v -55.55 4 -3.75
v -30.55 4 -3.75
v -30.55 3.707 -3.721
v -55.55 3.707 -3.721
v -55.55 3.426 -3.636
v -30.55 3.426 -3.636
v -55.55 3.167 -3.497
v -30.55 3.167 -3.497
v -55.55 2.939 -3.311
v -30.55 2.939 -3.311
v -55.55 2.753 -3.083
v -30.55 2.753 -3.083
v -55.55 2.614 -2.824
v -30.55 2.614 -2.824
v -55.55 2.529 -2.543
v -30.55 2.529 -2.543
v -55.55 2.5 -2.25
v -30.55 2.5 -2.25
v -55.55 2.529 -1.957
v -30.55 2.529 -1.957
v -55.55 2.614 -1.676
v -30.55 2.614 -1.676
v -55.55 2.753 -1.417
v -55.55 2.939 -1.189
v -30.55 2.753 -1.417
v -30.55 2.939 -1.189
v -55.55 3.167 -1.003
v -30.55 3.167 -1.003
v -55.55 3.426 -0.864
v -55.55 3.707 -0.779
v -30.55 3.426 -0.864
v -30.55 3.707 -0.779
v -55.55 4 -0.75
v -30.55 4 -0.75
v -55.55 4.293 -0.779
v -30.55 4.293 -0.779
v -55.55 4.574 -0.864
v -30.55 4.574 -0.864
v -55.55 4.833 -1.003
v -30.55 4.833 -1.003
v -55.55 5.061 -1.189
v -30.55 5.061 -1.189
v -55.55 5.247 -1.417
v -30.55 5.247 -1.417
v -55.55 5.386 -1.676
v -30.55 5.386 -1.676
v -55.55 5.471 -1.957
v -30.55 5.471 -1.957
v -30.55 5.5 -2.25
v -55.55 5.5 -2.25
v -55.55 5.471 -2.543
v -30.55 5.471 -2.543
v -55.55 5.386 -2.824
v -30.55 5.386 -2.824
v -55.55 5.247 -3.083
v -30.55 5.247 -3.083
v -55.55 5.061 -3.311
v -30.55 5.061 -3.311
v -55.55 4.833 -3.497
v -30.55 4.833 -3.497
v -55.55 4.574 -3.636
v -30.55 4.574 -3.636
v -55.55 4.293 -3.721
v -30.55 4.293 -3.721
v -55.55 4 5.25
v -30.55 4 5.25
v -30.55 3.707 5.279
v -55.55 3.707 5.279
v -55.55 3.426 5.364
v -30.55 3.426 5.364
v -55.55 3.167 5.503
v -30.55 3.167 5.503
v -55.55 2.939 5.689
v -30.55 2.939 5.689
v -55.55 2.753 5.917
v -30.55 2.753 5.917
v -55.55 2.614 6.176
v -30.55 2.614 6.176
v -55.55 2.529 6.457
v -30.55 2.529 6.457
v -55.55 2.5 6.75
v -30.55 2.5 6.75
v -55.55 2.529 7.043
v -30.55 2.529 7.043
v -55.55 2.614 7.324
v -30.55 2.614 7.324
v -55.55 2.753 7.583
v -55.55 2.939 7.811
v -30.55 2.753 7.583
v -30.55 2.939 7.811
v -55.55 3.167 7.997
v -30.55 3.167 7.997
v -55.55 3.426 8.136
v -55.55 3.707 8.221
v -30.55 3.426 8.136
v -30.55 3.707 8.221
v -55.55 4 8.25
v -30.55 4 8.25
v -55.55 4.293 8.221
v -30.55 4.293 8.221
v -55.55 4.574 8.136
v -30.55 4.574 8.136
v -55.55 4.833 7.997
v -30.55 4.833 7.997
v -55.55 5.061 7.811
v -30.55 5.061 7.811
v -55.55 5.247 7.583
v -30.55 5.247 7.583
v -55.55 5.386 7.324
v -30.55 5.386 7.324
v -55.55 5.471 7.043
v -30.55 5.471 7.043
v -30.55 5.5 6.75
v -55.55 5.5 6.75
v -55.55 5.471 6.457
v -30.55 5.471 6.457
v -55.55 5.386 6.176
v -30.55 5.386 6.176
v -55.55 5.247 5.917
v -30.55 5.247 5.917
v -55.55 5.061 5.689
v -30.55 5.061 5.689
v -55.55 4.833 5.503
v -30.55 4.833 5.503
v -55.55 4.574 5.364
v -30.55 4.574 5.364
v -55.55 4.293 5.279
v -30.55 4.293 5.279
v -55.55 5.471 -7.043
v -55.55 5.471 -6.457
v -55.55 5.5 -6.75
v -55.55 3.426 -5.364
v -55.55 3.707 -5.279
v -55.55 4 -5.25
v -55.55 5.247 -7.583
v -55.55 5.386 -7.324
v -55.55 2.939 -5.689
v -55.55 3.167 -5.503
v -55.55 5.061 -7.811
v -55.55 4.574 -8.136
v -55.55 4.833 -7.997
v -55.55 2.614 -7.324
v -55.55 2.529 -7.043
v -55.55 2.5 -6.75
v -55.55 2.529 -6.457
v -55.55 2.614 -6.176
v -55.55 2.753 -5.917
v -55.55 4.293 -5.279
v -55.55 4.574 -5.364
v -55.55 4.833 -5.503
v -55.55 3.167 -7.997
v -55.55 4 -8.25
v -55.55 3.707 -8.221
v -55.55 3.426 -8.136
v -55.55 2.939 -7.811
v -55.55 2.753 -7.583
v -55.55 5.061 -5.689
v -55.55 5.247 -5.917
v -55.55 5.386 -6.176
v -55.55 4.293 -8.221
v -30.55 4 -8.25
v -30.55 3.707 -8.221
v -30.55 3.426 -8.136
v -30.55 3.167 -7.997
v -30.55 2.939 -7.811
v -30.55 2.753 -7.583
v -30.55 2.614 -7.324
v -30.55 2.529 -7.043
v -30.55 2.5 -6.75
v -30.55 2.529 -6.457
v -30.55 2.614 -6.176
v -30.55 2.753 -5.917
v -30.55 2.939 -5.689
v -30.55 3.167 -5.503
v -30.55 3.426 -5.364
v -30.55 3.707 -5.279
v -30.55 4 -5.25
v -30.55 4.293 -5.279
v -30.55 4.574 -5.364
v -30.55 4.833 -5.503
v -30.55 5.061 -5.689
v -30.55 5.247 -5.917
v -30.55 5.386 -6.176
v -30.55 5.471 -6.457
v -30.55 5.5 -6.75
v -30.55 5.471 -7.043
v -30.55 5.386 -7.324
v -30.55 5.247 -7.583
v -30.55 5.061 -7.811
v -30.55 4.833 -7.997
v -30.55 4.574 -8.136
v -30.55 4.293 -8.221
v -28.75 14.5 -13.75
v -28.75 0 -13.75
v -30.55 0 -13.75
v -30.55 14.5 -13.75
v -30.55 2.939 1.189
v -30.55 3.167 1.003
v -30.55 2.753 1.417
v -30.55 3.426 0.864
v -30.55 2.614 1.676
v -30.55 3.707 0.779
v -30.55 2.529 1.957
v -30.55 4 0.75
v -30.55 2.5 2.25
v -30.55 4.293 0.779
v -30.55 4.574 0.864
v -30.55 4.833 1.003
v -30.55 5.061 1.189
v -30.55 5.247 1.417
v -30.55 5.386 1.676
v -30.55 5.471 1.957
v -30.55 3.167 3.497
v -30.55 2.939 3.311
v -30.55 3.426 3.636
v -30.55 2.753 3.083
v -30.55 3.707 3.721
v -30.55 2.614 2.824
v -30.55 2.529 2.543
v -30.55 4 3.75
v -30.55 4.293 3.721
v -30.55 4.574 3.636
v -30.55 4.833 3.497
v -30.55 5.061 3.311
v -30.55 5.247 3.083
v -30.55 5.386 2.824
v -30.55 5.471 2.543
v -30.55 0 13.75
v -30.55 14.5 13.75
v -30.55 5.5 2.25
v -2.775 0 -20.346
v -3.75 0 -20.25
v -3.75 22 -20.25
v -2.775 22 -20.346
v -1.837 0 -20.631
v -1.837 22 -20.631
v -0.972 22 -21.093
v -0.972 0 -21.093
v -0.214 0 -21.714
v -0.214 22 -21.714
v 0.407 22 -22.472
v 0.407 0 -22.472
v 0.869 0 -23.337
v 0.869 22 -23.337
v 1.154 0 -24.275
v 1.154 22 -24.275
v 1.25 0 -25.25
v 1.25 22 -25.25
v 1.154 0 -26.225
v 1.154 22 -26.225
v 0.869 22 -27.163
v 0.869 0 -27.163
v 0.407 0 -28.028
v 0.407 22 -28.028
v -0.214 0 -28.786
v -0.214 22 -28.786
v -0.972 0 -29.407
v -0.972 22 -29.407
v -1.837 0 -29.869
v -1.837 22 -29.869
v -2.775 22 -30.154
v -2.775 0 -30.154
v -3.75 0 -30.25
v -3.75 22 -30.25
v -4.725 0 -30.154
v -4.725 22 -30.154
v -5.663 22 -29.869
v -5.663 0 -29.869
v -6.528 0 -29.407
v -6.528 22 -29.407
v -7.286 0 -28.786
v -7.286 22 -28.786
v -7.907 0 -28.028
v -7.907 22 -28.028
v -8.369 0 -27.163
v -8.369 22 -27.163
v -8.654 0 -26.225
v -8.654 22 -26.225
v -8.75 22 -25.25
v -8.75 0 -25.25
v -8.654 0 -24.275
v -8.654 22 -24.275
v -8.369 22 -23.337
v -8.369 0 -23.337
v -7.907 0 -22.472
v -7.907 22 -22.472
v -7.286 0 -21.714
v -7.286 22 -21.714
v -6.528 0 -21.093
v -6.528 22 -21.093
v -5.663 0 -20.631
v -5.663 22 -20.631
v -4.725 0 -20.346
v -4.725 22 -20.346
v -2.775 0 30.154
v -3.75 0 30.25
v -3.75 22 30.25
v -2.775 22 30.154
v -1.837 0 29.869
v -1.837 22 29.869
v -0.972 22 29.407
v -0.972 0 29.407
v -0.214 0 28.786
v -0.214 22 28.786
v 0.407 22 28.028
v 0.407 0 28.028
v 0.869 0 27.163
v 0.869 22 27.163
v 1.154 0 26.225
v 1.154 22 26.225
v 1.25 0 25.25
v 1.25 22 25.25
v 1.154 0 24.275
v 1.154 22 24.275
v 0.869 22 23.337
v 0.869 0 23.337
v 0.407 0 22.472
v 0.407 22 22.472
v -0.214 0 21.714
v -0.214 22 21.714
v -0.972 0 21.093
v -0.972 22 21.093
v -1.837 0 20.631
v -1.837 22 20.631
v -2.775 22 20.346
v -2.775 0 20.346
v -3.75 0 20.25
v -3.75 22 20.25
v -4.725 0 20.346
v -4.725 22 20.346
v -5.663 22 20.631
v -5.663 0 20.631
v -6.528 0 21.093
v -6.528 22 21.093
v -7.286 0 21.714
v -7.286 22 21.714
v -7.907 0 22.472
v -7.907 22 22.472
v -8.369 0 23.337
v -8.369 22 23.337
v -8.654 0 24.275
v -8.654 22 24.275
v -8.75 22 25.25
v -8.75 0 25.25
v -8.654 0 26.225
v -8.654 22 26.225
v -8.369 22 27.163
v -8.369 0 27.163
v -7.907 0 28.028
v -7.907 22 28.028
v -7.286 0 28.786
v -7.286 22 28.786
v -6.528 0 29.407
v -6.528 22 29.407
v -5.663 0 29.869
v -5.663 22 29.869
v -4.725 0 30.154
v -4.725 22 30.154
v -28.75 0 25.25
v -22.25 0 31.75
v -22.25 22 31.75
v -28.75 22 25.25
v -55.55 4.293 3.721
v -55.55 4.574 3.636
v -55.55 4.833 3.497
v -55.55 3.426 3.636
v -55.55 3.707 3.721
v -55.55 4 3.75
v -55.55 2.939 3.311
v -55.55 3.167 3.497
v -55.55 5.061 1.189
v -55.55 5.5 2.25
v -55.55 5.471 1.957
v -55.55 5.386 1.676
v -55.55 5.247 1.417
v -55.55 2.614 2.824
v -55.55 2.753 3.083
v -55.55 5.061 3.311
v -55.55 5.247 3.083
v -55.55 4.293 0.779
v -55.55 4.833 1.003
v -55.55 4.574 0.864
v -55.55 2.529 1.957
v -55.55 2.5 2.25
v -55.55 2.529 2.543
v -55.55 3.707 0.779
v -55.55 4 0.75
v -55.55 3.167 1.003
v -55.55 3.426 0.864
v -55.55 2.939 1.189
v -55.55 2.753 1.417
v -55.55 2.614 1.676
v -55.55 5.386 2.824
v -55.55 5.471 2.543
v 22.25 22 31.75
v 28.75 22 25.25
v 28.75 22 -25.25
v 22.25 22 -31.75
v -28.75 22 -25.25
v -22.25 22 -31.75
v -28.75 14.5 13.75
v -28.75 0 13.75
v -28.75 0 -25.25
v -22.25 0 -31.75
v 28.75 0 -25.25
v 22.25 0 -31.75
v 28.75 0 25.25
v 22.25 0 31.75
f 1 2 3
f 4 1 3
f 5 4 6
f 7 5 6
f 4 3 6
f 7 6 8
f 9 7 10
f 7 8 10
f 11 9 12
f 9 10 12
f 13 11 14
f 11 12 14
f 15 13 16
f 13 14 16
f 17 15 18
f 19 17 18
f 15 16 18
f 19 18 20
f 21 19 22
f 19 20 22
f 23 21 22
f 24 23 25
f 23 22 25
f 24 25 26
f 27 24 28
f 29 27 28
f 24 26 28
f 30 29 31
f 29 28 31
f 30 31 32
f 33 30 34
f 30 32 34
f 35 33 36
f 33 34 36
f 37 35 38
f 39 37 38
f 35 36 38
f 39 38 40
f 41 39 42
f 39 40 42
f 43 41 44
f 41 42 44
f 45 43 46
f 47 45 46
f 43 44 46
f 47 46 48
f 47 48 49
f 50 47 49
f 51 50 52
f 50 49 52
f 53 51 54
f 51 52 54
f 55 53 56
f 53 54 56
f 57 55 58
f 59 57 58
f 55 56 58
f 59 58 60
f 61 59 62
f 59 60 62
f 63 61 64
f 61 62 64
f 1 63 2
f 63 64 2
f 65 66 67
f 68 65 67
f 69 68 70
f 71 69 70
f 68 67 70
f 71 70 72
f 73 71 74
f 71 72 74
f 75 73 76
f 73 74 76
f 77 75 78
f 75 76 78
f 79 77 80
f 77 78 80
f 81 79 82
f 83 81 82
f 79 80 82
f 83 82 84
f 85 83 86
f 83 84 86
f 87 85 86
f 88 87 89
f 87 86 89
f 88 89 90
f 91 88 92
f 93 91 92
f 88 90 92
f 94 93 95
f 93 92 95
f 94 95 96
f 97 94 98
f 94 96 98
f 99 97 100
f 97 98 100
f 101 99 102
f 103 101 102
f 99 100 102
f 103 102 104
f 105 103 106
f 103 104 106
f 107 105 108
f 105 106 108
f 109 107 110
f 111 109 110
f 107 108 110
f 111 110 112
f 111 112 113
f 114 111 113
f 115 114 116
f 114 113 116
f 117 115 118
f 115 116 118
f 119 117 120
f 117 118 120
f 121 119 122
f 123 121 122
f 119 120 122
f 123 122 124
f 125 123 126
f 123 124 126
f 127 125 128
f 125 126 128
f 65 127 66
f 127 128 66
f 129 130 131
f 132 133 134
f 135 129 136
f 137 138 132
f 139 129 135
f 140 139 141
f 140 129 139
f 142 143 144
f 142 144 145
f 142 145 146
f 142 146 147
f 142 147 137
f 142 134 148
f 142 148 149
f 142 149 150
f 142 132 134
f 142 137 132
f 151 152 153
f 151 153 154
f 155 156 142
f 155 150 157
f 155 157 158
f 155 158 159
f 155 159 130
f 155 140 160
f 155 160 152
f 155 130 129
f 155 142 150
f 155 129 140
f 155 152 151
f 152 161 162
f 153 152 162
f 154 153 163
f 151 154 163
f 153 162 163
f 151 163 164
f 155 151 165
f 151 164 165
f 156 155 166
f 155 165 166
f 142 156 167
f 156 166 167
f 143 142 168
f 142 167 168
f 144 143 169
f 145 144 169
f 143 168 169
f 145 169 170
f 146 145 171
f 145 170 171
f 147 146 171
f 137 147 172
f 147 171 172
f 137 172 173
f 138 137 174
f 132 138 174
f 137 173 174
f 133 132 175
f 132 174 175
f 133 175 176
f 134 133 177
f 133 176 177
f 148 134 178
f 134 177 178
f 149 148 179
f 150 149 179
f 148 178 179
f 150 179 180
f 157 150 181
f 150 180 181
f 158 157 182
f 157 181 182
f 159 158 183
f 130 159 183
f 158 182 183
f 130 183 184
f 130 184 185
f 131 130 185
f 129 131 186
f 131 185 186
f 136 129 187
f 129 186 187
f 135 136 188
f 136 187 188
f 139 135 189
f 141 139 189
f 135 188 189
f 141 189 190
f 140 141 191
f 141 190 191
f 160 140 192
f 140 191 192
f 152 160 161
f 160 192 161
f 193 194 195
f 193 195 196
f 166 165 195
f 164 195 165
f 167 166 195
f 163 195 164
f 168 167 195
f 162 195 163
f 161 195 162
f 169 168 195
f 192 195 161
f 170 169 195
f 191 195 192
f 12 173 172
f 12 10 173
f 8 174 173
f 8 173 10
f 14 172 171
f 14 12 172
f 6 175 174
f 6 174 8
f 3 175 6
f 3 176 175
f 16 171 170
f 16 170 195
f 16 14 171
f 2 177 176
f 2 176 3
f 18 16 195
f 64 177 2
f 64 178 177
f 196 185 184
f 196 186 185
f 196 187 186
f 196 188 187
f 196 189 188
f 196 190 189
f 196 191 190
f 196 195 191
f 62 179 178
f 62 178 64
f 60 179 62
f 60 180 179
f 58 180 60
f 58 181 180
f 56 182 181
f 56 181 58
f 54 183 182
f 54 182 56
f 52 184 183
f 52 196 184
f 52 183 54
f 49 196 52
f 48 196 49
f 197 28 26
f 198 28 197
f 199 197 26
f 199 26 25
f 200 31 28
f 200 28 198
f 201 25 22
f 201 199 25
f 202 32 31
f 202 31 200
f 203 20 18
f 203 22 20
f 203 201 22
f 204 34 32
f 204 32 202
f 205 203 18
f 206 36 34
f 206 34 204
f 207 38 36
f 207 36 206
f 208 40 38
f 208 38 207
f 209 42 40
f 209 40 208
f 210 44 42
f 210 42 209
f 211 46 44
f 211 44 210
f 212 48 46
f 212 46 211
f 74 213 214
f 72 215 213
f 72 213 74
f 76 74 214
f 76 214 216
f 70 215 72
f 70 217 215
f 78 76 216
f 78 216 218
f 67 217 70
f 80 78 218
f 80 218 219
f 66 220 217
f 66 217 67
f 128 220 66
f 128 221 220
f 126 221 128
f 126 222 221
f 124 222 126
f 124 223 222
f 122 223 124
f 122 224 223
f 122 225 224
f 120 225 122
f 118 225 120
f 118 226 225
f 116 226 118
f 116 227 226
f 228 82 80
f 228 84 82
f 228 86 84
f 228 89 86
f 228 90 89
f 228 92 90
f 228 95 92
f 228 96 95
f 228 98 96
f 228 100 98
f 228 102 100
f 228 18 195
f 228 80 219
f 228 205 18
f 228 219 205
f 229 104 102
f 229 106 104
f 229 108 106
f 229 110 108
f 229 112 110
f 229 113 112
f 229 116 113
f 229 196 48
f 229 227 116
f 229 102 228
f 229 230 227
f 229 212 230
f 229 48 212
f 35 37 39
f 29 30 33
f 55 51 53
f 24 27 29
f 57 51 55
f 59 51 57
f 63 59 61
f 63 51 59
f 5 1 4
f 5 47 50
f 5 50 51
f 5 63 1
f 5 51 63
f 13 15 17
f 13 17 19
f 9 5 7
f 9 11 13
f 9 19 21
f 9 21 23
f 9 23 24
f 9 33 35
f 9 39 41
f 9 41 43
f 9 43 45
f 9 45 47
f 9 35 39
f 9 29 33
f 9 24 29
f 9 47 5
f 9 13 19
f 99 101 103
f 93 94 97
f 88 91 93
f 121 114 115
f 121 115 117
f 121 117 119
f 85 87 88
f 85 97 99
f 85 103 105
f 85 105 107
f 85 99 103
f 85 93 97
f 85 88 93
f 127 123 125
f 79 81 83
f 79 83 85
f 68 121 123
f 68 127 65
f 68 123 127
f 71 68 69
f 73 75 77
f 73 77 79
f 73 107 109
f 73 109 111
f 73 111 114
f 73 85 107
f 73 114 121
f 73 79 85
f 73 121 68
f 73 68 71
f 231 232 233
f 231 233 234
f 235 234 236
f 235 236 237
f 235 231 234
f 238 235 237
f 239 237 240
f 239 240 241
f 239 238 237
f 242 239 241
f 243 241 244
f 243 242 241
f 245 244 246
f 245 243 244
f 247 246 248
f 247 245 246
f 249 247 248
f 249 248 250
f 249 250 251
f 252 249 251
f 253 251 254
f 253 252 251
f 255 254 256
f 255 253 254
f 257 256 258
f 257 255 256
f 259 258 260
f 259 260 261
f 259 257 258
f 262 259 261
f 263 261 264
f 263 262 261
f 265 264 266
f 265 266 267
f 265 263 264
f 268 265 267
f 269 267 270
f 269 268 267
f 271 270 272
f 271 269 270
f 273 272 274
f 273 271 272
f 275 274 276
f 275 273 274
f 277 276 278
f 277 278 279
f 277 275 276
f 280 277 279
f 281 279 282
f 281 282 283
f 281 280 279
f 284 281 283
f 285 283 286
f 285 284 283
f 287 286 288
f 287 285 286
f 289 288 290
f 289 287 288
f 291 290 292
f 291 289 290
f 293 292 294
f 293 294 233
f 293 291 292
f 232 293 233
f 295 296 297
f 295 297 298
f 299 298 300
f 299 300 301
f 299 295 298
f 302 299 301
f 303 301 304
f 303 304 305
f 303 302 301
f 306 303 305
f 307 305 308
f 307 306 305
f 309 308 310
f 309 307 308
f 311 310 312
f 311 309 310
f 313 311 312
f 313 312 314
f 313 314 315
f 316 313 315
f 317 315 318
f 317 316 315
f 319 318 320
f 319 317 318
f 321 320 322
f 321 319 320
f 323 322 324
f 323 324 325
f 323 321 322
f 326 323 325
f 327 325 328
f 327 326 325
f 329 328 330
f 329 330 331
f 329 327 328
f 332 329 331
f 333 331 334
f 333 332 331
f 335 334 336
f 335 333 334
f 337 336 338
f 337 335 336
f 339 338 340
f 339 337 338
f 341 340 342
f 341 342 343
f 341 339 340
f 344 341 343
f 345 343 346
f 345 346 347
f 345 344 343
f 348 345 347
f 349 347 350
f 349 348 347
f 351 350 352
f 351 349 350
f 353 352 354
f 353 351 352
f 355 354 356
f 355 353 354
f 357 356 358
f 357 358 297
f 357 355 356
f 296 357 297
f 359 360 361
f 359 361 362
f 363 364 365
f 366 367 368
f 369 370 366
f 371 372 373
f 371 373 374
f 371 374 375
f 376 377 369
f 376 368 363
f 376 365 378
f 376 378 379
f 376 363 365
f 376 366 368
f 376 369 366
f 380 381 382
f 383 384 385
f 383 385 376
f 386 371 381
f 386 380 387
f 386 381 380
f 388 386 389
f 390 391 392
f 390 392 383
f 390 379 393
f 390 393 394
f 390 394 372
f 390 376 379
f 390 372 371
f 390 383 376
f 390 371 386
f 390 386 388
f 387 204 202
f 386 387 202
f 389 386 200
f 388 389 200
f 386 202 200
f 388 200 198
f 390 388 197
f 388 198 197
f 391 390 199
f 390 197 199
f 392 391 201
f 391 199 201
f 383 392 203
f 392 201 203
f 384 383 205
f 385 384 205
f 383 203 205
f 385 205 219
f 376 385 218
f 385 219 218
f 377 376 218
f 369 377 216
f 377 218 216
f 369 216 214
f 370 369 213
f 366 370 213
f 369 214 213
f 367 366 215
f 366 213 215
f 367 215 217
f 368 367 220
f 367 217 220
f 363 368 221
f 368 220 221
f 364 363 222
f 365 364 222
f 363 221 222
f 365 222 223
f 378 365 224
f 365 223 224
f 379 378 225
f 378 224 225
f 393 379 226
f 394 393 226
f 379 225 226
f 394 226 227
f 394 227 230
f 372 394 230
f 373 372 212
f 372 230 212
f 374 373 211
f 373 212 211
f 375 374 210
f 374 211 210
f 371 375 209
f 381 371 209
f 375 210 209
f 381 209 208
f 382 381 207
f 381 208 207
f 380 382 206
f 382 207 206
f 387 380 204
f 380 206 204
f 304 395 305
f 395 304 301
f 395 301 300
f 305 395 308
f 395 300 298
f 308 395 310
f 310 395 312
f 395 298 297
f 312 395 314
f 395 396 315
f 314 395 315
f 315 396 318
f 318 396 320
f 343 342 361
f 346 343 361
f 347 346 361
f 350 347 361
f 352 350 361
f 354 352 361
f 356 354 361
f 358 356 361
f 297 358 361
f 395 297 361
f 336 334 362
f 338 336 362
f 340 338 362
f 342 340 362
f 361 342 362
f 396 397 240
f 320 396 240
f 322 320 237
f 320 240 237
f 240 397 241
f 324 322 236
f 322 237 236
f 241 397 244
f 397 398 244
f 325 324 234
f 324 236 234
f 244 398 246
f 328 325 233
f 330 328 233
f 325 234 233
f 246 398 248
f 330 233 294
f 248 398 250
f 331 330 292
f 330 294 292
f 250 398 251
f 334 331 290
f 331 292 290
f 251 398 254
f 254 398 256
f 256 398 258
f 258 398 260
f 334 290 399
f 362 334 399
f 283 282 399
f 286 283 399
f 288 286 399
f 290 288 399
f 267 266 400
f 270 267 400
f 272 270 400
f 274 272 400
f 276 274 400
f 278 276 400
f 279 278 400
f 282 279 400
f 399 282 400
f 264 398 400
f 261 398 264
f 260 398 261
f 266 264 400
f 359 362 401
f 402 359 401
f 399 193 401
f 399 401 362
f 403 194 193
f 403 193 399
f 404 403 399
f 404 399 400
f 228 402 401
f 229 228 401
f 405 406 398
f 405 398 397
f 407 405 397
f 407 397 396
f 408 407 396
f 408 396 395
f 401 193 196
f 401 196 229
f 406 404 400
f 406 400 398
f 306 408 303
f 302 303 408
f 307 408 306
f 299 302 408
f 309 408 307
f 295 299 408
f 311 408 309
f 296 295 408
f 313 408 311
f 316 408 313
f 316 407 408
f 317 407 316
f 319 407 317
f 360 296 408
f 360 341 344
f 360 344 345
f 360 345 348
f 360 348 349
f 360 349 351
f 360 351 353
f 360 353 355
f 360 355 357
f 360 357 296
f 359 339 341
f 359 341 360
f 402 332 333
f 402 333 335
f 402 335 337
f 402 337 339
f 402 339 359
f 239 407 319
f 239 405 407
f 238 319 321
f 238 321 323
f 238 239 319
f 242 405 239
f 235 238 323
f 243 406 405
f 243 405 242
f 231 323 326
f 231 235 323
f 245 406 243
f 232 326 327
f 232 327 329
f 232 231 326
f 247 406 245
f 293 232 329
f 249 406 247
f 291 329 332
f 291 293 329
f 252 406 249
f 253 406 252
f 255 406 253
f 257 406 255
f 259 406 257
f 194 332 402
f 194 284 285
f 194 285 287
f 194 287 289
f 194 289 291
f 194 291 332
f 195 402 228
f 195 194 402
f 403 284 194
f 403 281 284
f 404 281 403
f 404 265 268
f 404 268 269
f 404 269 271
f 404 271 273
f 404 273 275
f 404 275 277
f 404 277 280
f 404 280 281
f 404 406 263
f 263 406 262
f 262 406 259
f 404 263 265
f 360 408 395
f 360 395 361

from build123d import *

# Parameters (mm, degrees)
SKETCH1_R             = 5
BASE_DEPTH            = 22
SKETCH2_W             = 27.5
SKETCH2_H             = 14.5
WIRE_INSERTIONS_DEPTH = 1.8
SKETCH3_R             = 1.5
GND_WIRES_DEPTH       = 25
SKETCH4_R             = 1.5
OUTPUT_WIRE_DEPTH     = 25
SKETCH5_R             = 1.5
INPUT_WIRE_DEPTH      = 25


with BuildPart() as part:
    # Sketch1 → Base (new body)
    with BuildSketch(Plane(origin=(0, 0, 0), x_dir=(1, 0, 0), z_dir=(0, 1, 0))):
        Polygon((22.25, -31.75), (-22.25, -31.75), (-28.75, -25.25), (-28.75, 25.25), (-22.25, 31.75), (22.25, 31.75), (28.75, 25.25), (28.75, -25.25), align=None)
        with Locations(Location((-3.75, -25.25, 0), (0, 0, 270))):
            Circle(SKETCH1_R, mode=Mode.SUBTRACT)
        with Locations(Location((-3.75, 25.25, 0), (0, 0, 270))):
            Circle(SKETCH1_R, mode=Mode.SUBTRACT)
    extrude(amount=BASE_DEPTH)

    # Sketch2 → Wire Insertions (add)
    with BuildSketch(Plane.ZY.offset(28.75)):
        with Locations((0, 7.25)):
            Rectangle(SKETCH2_W, SKETCH2_H)
    extrude(amount=WIRE_INSERTIONS_DEPTH)

    # Sketch3 → GND Wires (add)
    with BuildSketch(Plane.ZY.offset(30.55)):
        with Locations(Location((-2.25, 4, 0), (0, 0, 180))):
            Circle(SKETCH3_R)
        with Locations(Location((2.25, 4, 0), (0, 0, 180))):
            Circle(SKETCH3_R)
    extrude(amount=GND_WIRES_DEPTH)

    # Sketch4 → Output Wire (add)
    with BuildSketch(Plane.ZY.offset(30.55)):
        with Locations(Location((-6.75, 4, 0), (0, 0, 180))):
            Circle(SKETCH4_R)
    extrude(amount=OUTPUT_WIRE_DEPTH)

    # Sketch5 → Input Wire (add)
    with BuildSketch(Plane.ZY.offset(30.55)):
        with Locations(Location((6.75, 4, 0), (0, 0, 180))):
            Circle(SKETCH5_R)
    extrude(amount=INPUT_WIRE_DEPTH)


solid = part.part
